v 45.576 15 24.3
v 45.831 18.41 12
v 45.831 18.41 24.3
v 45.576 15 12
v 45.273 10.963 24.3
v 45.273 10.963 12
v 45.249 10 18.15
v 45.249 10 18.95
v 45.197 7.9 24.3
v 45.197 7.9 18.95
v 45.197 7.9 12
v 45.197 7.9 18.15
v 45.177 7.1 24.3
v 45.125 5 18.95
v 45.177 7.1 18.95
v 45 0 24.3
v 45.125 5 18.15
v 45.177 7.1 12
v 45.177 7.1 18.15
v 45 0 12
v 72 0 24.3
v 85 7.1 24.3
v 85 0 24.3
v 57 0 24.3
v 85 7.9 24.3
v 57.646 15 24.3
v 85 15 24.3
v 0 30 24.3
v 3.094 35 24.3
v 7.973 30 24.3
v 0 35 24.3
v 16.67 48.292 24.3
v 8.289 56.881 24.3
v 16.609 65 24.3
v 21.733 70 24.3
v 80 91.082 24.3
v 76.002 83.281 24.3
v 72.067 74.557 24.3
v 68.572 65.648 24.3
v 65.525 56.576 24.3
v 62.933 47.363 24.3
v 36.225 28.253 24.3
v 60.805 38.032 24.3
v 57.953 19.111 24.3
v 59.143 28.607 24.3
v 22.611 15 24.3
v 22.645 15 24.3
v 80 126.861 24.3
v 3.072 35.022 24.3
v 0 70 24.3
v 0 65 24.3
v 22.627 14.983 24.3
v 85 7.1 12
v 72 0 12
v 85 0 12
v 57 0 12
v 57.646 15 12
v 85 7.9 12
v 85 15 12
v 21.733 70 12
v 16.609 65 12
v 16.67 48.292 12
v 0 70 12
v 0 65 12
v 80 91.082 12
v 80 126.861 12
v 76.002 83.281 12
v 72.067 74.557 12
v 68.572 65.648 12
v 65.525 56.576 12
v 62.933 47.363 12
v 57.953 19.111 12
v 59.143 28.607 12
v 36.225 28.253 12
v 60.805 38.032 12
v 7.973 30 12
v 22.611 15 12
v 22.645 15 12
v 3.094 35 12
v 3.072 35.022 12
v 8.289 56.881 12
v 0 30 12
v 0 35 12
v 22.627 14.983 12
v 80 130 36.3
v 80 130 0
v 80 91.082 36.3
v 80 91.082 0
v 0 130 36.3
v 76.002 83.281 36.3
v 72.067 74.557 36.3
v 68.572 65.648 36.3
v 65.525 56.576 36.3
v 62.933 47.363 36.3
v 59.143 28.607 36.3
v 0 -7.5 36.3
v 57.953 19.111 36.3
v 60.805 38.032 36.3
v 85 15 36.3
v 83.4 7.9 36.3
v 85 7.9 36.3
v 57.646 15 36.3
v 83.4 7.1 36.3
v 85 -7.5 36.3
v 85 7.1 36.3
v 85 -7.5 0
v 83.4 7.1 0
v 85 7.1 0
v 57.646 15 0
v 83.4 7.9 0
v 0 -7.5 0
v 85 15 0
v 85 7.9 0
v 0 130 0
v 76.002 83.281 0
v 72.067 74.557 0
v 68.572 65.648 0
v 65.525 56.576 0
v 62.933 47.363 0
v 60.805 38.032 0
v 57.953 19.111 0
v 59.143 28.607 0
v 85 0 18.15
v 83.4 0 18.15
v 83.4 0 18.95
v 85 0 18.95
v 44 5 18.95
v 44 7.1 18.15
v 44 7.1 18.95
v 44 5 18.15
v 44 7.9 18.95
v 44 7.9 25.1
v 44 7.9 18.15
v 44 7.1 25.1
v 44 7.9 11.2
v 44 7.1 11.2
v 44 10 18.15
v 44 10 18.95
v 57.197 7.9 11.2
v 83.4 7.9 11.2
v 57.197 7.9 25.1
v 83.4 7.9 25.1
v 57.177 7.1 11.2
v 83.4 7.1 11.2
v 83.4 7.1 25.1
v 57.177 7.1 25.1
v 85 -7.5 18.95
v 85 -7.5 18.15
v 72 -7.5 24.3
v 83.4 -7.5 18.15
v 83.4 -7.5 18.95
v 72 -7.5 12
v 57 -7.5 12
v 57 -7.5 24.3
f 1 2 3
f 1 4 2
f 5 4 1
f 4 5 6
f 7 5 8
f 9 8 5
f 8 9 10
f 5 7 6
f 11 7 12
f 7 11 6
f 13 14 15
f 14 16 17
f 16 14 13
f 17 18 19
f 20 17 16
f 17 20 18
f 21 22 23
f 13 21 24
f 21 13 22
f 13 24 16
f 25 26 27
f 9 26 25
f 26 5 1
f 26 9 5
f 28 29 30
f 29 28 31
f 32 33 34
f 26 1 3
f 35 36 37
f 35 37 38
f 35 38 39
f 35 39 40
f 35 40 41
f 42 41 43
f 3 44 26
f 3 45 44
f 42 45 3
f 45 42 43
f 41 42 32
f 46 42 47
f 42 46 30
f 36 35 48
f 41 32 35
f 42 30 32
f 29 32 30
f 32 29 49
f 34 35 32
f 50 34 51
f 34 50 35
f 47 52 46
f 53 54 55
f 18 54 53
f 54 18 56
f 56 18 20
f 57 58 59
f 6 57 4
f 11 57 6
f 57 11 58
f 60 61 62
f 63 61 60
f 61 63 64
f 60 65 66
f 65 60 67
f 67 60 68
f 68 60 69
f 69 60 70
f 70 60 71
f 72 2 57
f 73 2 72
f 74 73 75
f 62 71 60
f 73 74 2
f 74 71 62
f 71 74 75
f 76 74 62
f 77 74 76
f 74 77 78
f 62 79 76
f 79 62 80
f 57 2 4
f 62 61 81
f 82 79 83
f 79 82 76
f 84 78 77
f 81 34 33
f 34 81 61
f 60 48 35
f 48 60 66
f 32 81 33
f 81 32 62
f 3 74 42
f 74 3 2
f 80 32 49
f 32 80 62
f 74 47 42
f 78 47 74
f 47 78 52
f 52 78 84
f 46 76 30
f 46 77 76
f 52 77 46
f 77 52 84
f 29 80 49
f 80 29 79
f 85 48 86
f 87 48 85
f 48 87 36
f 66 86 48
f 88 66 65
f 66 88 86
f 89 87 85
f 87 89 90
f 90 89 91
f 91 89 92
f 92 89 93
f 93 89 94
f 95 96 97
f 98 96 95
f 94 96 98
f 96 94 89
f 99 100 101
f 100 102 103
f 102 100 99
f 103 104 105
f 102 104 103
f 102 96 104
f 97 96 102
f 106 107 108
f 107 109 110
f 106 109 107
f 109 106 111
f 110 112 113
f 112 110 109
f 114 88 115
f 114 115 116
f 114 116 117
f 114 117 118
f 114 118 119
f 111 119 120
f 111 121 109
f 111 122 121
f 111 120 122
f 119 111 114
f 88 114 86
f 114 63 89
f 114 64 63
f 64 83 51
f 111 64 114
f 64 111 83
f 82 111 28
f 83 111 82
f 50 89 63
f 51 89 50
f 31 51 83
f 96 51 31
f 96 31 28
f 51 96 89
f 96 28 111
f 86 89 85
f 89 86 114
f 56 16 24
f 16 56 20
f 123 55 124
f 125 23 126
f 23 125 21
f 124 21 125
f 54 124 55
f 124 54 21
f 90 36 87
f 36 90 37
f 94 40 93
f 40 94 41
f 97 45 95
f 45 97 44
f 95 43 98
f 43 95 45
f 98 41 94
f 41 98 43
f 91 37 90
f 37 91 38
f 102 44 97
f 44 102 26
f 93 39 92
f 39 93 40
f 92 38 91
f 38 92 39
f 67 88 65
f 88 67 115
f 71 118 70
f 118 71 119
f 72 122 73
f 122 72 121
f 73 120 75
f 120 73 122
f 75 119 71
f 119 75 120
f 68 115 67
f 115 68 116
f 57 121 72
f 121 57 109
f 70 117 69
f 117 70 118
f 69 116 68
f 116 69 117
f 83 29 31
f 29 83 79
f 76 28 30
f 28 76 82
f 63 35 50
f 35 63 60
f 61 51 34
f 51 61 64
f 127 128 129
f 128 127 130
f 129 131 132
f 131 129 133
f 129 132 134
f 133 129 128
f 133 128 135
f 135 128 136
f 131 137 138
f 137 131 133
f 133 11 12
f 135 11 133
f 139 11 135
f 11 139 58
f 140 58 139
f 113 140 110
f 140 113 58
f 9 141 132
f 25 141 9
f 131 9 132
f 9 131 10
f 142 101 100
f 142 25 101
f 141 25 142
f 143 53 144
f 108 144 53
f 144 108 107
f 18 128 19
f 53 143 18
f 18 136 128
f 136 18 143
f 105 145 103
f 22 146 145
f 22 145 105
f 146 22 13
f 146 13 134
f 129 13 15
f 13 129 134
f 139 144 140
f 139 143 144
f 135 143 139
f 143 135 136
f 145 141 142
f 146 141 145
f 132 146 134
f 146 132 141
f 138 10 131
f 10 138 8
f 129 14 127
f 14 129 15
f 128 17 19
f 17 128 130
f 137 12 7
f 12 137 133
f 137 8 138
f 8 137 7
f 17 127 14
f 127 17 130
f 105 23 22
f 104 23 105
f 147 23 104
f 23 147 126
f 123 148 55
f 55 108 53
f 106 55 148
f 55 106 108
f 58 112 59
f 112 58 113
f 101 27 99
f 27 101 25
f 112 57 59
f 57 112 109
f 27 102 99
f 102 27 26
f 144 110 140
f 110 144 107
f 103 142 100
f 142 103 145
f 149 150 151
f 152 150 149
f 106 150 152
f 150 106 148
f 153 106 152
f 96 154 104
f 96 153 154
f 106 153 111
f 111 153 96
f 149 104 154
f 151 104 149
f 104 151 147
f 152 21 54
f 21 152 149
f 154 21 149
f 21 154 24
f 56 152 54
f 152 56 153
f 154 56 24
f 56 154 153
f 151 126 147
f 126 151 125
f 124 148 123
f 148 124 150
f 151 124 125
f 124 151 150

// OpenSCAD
/* RailEduKit/InteractiveSignallingLaboratory © 2025 by Martin Scheidt and contributors
 * License: CC-BY 4.0 - https://creativecommons.org/licenses/by/4.0/
 * Project description: The Interactive Signalling Laboratory is a tool for training in Rail
 * Applications to enhance the knowledge of control and signalling principles for rail transport systems.
 *
 * Module: drill_template_switch
 */

include <config/global_variables.scad>

module switch_shape() {
	translate([ dtc_outer_radius + 45, 0, dtc_cutout_z_pos ])
	rotate([ 0, 0, 180 - curve_angle ])
	union() {
		rotate_extrude(angle = curve_angle) square([ dtc_outer_radius, dtc_cutout_height ]);
		translate([ dtc_outer_radius - rail_width - 15, 0, 0 ])
		cube([ rail_width + 15, straight_length, dsc_depth ]);
		translate([ dtc_outer_radius - (rail_width - 12) - 12, 0, 0 ])
		cube([ rail_width - 12, straight_length + 19, dsc_depth ]);
	}
}

module drill_template_switch() {
	difference() {
		cube([ 80, 130, dtc_height ]); // dtc_height
		switch_shape();

		// curved sides
		translate([ 24 + dtc_outer_radius + dsg_thickness, 0, dtc_cutout_z_pos + dtc_cutout_height ])
		rotate([ 0, 0, 180 - curve_angle ])
		rotate_extrude(angle = curve_angle) square([ dtc_middle_radius, dtc_cutout_z_pos ]);
		translate([ 24 + dtc_outer_radius + dsg_thickness, 0, 0 ])
		rotate([ 0, 0, 180 - curve_angle ])
		rotate_extrude(angle = curve_angle) square([ dtc_middle_radius, dtc_cutout_z_pos ]);

		// ground holes
		translate([ 0, 30, dtc_cutout_z_pos ])
		cube([ 60, dsg_hole_depth, dtc_cutout_height ]);
		translate([ 0, 65, dtc_cutout_z_pos ])
		cube([ 60, dsg_hole_depth, dtc_cutout_height ]);

		// hole position lines
		translate([ 44, dtch_y_pos - thin_line / 2, dtc_cutout_z_pos ])
		cube([ 2 * thin_line, thin_line, dtc_cutout_height ]);
		translate([ 44, dtch_y_pos - thin_line / 2, dtc_cutout_z_pos - thin_line ])
		cube([ dtc_cutout_z_pos + 5, thin_line, thin_line ]);
		translate([ 44, dtch_y_pos - thin_line / 2, dtc_cutout_z_pos + dtc_cutout_height ])
		cube([ dtc_cutout_z_pos + 5, thin_line, thin_line ]);
		translate([ 44, dtch_y_pos - 5 / 2, dtc_cutout_z_pos + dtch_z_pos ])
		cube([ 2 * thin_line, 5, thin_line ]);
	}
	// translate([0,-5,0]) cube([45+12, 5,dtc_height]);
	difference() {
		union() {
			// stabilisation pillar
			cube([ 45 + rail_width, 15, dtc_cutout_z_pos ]);
			translate([ 0, 0, dtc_cutout_z_pos + dtc_cutout_height ])
			cube([ 45 + rail_width, 15, dtc_cutout_z_pos ]);
		}
		translate([ 45 + rail_width - 2 * thin_line, dtch_y_pos - thin_line / 2, dtc_cutout_z_pos - dtc_cutout_height ])
		cube([ 2 * thin_line, thin_line, dtc_cutout_height ]);
		translate([ 45 + rail_width - 2 * thin_line, dtch_y_pos - thin_line / 2, dtc_cutout_z_pos + dtc_cutout_height ])
		cube([ 2 * thin_line, thin_line, dtc_cutout_height ]);
		translate([ 44, dtch_y_pos - thin_line / 2, dtc_cutout_z_pos - thin_line ])
		cube([ dtc_cutout_z_pos + rail_width, thin_line, thin_line ]);
		translate([ 44, dtch_y_pos - thin_line / 2, dtc_cutout_z_pos + dtc_cutout_height ])
		cube([ dtc_cutout_z_pos + rail_width, thin_line, thin_line ]);
	}
	// connector space
	difference() {
		translate([ 0, -dsc_connector_width / 2, 0 ])
		cube([ 45 + rail_width, dsc_connector_width / 2, 2 * dtc_cutout_z_pos + dtc_cutout_height ]);
		translate([ 45 + 12, -dsc_connector_width, dtc_cutout_z_pos ])
		cube([ dsc_connector_height, dsc_connector_width, dsc_depth ]);
		translate([ 45 + rail_width - 2 * thin_line, -dsc_connector_width, dtc_cutout_z_pos + dtch_z_pos ])
		cube([ 2 * thin_line, dsc_connector_width, thin_line ]);
	}
}
// switch_shape();

drill_template_switch();
